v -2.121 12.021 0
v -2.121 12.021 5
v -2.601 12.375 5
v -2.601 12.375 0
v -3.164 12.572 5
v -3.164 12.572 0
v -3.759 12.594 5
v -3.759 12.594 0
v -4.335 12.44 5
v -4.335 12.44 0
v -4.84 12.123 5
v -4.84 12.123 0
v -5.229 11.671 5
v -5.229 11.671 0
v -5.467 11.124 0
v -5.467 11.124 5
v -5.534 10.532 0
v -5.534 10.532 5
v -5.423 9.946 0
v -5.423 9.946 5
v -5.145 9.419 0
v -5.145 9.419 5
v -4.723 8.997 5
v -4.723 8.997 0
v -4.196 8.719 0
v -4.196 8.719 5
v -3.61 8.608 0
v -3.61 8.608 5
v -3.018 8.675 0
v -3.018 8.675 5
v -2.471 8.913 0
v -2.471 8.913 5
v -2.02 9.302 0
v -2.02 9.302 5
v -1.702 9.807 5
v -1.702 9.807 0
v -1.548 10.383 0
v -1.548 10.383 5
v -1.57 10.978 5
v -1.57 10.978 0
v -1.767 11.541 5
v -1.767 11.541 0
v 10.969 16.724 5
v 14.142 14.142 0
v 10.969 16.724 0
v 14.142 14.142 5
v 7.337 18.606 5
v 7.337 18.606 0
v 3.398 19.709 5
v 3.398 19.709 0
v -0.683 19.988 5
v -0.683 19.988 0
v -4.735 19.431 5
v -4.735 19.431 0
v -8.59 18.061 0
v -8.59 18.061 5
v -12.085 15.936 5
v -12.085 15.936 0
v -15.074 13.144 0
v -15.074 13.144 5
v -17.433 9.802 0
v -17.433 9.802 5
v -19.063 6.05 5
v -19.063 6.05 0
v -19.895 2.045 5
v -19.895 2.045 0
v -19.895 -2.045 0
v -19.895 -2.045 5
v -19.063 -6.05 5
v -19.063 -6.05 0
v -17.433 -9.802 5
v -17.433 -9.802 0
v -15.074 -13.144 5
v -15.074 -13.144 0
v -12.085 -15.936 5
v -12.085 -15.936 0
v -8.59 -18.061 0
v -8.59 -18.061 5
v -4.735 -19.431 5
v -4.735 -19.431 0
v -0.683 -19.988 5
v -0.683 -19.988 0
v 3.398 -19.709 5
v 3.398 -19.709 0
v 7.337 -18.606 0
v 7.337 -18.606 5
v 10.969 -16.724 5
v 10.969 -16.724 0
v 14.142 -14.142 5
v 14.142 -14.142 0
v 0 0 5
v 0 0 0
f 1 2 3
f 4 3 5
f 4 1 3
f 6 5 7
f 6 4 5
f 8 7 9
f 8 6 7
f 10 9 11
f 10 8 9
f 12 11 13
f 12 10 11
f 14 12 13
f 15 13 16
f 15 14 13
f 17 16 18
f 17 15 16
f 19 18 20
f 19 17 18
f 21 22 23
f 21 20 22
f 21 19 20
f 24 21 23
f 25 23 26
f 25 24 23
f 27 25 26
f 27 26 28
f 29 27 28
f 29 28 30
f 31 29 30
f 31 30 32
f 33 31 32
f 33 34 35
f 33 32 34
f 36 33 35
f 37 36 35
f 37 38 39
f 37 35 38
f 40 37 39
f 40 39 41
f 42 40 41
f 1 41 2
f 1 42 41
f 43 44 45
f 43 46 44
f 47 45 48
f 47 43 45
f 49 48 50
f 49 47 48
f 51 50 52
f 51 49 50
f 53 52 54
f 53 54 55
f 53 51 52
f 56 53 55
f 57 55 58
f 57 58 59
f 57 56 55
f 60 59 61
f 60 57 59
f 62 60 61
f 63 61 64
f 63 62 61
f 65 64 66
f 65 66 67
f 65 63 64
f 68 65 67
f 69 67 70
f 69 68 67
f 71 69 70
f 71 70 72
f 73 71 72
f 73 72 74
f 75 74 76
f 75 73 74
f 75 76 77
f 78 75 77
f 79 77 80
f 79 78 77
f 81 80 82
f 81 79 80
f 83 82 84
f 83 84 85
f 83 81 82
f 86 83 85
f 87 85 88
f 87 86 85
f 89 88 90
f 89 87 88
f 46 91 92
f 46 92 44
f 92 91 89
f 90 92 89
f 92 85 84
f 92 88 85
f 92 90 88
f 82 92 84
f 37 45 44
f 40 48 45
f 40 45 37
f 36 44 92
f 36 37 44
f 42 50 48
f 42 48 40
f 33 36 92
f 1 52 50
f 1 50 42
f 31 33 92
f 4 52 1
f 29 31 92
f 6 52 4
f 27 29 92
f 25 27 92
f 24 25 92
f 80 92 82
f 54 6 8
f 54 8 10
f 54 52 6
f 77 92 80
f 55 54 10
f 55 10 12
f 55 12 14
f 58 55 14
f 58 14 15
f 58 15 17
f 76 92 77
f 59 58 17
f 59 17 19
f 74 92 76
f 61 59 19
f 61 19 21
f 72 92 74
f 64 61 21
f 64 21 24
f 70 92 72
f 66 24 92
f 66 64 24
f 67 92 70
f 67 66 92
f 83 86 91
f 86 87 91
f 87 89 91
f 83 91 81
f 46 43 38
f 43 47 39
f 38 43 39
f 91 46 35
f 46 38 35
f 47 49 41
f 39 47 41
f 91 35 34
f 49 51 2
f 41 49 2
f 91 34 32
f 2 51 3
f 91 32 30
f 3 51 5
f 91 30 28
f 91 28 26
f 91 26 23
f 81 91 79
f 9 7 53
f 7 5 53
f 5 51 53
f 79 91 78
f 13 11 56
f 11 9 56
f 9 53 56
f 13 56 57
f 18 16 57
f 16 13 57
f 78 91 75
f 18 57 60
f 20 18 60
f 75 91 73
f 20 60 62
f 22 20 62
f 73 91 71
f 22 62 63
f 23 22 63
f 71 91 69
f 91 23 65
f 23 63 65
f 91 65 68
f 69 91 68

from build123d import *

# Parameters (mm, degrees)
CYLINDER001_R       = 2
CYLINDER001_DEPTH   = 10
CYLINDER_W          = 20
CYLINDER_H          = 5
CYLINDER_ANGLE      = 270
CUT_PLACEMENT_ANGLE = 45


with BuildPart() as cilindro001:
    # Cylinder001 → Cylinder001 (new body)
    with BuildSketch(Plane(origin=(5, 10, 0), x_dir=(1, 0, 0), z_dir=(0, 0, 1))):
        Circle(CYLINDER001_R)
    extrude(amount=CYLINDER001_DEPTH)


with BuildPart() as cut:
    # Cylinder → Cylinder (revolve)
    with BuildSketch(Plane.XZ):
        with Locations((10, 2.5)):
            Rectangle(CYLINDER_W, CYLINDER_H)
    revolve(axis=Axis((0, 0, 0), (0, 0, 1)), revolution_arc=CYLINDER_ANGLE)

    # Cut: cut Cilindro001
    add(cilindro001.part, mode=Mode.SUBTRACT)


with BuildPart() as cut_1:
    # Cut placement: moved
    add(cut.part.rotate(Axis((0, 0, 0), (0, 0, 1)), CUT_PLACEMENT_ANGLE))


solid = cut_1.part
